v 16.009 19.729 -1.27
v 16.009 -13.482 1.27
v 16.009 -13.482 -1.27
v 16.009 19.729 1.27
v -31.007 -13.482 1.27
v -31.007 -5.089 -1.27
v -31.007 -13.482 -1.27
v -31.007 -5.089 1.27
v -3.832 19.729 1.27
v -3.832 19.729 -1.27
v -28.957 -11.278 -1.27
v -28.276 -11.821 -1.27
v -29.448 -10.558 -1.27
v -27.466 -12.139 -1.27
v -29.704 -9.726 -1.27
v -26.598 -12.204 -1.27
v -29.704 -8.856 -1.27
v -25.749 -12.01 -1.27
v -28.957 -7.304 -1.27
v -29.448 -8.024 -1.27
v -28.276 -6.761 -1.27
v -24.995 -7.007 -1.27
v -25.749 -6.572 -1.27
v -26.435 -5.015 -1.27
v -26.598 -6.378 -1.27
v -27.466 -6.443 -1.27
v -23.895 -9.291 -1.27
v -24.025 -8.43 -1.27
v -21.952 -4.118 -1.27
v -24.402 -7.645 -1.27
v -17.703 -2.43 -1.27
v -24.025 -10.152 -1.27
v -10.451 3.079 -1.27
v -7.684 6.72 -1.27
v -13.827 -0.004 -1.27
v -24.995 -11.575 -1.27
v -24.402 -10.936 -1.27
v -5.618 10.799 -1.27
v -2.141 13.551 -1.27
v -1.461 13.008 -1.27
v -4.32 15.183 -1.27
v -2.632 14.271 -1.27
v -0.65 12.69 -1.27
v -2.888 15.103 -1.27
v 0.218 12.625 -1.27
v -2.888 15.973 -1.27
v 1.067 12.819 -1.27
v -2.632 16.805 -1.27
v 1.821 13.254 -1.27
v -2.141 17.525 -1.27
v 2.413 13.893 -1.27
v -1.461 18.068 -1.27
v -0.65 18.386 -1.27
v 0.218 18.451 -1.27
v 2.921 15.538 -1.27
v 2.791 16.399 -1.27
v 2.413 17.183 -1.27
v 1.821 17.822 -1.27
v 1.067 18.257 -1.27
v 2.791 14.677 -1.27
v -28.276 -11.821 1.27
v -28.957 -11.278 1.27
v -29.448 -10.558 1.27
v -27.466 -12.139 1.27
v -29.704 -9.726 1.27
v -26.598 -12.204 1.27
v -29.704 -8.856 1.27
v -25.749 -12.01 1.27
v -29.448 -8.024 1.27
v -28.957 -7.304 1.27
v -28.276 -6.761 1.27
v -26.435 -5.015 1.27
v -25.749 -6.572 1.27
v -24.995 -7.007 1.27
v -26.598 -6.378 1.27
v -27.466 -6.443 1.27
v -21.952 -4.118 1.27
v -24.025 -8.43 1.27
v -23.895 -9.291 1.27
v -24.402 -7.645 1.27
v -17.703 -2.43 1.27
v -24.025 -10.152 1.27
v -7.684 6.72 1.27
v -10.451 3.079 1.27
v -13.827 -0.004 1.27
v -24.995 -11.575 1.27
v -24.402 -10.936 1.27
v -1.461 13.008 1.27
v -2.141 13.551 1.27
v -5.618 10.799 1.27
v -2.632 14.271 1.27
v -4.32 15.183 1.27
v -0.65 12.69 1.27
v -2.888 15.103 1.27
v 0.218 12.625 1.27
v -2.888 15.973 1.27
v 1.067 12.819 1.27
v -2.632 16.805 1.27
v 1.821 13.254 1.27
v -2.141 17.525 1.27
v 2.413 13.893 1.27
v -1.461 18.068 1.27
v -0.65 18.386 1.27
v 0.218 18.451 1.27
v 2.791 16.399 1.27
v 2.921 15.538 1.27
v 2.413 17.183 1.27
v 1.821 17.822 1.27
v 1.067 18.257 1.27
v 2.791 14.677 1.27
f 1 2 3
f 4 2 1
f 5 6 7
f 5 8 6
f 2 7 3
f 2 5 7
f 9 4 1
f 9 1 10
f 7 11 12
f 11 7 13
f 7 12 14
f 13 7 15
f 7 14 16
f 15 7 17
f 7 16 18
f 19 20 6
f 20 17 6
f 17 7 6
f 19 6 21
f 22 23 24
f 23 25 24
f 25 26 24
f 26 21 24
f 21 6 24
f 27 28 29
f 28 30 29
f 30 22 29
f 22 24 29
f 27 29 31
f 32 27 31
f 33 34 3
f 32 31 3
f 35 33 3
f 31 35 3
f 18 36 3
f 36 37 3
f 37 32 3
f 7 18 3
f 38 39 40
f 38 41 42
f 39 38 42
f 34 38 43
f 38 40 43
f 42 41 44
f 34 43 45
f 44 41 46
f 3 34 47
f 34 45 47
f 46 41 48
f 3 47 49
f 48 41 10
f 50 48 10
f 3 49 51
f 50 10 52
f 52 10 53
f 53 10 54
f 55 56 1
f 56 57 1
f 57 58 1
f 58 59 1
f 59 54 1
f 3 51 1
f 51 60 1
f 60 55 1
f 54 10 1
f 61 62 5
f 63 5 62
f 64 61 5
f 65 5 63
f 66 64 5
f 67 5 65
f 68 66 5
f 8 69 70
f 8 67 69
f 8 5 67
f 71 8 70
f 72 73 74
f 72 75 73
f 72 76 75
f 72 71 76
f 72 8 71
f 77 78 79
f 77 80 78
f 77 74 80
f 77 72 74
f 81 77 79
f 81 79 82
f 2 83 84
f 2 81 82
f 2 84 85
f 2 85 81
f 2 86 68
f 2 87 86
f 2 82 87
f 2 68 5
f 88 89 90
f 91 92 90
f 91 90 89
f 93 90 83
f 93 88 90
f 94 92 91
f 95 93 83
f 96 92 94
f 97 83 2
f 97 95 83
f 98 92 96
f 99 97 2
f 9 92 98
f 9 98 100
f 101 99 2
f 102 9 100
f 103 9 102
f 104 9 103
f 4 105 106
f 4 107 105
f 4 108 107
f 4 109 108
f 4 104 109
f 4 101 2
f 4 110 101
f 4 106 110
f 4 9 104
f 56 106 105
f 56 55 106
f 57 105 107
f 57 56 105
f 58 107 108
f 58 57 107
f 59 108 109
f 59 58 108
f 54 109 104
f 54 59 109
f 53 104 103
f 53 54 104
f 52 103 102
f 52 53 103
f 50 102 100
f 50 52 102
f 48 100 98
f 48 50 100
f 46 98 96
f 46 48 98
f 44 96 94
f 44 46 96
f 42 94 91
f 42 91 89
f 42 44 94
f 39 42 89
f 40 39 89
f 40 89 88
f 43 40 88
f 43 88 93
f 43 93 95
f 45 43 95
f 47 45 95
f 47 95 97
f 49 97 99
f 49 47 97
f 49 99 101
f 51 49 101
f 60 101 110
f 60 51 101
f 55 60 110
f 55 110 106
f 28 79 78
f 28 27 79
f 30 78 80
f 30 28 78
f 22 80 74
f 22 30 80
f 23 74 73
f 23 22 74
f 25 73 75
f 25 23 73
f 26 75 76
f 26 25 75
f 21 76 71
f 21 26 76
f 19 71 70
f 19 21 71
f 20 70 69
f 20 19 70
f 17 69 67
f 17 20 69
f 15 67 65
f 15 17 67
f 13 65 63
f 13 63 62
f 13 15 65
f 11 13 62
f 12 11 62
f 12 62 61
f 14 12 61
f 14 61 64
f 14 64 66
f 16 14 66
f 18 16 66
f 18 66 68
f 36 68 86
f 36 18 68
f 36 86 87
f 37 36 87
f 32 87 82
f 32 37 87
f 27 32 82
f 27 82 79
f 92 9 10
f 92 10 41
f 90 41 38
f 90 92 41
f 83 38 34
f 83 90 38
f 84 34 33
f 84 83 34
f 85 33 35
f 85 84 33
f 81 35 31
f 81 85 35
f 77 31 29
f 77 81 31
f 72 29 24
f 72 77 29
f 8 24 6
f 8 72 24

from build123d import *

# Parameters (mm, degrees)
F0_R     = 2.921
F1_DEPTH = 1.27


with BuildPart() as f1:
    # F0 (on Top) → F1 (new body, symmetric)
    with BuildSketch(Plane.XY):
        with BuildLine():
            Line((16.008551, -13.481906), (16.008551, 19.728972))
            Line((16.008551, 19.728972), (-3.832283, 19.728972))
            ThreePointArc((-3.832283, 19.728972), (-12.068809, 1.461038), (-31.006849, -5.089415))
            Line((-31.006849, -5.089415), (-31.006849, -13.481906))
            Line((-31.006849, -13.481906), (16.008551, -13.481906))
        make_face()
        with Locations((-26.815849, -9.290906)):
            Circle(F0_R, mode=Mode.SUBTRACT)
        with Locations((0, 15.537972)):
            Circle(F0_R, mode=Mode.SUBTRACT)
    extrude(amount=F1_DEPTH, both=True)


solid = f1.part
